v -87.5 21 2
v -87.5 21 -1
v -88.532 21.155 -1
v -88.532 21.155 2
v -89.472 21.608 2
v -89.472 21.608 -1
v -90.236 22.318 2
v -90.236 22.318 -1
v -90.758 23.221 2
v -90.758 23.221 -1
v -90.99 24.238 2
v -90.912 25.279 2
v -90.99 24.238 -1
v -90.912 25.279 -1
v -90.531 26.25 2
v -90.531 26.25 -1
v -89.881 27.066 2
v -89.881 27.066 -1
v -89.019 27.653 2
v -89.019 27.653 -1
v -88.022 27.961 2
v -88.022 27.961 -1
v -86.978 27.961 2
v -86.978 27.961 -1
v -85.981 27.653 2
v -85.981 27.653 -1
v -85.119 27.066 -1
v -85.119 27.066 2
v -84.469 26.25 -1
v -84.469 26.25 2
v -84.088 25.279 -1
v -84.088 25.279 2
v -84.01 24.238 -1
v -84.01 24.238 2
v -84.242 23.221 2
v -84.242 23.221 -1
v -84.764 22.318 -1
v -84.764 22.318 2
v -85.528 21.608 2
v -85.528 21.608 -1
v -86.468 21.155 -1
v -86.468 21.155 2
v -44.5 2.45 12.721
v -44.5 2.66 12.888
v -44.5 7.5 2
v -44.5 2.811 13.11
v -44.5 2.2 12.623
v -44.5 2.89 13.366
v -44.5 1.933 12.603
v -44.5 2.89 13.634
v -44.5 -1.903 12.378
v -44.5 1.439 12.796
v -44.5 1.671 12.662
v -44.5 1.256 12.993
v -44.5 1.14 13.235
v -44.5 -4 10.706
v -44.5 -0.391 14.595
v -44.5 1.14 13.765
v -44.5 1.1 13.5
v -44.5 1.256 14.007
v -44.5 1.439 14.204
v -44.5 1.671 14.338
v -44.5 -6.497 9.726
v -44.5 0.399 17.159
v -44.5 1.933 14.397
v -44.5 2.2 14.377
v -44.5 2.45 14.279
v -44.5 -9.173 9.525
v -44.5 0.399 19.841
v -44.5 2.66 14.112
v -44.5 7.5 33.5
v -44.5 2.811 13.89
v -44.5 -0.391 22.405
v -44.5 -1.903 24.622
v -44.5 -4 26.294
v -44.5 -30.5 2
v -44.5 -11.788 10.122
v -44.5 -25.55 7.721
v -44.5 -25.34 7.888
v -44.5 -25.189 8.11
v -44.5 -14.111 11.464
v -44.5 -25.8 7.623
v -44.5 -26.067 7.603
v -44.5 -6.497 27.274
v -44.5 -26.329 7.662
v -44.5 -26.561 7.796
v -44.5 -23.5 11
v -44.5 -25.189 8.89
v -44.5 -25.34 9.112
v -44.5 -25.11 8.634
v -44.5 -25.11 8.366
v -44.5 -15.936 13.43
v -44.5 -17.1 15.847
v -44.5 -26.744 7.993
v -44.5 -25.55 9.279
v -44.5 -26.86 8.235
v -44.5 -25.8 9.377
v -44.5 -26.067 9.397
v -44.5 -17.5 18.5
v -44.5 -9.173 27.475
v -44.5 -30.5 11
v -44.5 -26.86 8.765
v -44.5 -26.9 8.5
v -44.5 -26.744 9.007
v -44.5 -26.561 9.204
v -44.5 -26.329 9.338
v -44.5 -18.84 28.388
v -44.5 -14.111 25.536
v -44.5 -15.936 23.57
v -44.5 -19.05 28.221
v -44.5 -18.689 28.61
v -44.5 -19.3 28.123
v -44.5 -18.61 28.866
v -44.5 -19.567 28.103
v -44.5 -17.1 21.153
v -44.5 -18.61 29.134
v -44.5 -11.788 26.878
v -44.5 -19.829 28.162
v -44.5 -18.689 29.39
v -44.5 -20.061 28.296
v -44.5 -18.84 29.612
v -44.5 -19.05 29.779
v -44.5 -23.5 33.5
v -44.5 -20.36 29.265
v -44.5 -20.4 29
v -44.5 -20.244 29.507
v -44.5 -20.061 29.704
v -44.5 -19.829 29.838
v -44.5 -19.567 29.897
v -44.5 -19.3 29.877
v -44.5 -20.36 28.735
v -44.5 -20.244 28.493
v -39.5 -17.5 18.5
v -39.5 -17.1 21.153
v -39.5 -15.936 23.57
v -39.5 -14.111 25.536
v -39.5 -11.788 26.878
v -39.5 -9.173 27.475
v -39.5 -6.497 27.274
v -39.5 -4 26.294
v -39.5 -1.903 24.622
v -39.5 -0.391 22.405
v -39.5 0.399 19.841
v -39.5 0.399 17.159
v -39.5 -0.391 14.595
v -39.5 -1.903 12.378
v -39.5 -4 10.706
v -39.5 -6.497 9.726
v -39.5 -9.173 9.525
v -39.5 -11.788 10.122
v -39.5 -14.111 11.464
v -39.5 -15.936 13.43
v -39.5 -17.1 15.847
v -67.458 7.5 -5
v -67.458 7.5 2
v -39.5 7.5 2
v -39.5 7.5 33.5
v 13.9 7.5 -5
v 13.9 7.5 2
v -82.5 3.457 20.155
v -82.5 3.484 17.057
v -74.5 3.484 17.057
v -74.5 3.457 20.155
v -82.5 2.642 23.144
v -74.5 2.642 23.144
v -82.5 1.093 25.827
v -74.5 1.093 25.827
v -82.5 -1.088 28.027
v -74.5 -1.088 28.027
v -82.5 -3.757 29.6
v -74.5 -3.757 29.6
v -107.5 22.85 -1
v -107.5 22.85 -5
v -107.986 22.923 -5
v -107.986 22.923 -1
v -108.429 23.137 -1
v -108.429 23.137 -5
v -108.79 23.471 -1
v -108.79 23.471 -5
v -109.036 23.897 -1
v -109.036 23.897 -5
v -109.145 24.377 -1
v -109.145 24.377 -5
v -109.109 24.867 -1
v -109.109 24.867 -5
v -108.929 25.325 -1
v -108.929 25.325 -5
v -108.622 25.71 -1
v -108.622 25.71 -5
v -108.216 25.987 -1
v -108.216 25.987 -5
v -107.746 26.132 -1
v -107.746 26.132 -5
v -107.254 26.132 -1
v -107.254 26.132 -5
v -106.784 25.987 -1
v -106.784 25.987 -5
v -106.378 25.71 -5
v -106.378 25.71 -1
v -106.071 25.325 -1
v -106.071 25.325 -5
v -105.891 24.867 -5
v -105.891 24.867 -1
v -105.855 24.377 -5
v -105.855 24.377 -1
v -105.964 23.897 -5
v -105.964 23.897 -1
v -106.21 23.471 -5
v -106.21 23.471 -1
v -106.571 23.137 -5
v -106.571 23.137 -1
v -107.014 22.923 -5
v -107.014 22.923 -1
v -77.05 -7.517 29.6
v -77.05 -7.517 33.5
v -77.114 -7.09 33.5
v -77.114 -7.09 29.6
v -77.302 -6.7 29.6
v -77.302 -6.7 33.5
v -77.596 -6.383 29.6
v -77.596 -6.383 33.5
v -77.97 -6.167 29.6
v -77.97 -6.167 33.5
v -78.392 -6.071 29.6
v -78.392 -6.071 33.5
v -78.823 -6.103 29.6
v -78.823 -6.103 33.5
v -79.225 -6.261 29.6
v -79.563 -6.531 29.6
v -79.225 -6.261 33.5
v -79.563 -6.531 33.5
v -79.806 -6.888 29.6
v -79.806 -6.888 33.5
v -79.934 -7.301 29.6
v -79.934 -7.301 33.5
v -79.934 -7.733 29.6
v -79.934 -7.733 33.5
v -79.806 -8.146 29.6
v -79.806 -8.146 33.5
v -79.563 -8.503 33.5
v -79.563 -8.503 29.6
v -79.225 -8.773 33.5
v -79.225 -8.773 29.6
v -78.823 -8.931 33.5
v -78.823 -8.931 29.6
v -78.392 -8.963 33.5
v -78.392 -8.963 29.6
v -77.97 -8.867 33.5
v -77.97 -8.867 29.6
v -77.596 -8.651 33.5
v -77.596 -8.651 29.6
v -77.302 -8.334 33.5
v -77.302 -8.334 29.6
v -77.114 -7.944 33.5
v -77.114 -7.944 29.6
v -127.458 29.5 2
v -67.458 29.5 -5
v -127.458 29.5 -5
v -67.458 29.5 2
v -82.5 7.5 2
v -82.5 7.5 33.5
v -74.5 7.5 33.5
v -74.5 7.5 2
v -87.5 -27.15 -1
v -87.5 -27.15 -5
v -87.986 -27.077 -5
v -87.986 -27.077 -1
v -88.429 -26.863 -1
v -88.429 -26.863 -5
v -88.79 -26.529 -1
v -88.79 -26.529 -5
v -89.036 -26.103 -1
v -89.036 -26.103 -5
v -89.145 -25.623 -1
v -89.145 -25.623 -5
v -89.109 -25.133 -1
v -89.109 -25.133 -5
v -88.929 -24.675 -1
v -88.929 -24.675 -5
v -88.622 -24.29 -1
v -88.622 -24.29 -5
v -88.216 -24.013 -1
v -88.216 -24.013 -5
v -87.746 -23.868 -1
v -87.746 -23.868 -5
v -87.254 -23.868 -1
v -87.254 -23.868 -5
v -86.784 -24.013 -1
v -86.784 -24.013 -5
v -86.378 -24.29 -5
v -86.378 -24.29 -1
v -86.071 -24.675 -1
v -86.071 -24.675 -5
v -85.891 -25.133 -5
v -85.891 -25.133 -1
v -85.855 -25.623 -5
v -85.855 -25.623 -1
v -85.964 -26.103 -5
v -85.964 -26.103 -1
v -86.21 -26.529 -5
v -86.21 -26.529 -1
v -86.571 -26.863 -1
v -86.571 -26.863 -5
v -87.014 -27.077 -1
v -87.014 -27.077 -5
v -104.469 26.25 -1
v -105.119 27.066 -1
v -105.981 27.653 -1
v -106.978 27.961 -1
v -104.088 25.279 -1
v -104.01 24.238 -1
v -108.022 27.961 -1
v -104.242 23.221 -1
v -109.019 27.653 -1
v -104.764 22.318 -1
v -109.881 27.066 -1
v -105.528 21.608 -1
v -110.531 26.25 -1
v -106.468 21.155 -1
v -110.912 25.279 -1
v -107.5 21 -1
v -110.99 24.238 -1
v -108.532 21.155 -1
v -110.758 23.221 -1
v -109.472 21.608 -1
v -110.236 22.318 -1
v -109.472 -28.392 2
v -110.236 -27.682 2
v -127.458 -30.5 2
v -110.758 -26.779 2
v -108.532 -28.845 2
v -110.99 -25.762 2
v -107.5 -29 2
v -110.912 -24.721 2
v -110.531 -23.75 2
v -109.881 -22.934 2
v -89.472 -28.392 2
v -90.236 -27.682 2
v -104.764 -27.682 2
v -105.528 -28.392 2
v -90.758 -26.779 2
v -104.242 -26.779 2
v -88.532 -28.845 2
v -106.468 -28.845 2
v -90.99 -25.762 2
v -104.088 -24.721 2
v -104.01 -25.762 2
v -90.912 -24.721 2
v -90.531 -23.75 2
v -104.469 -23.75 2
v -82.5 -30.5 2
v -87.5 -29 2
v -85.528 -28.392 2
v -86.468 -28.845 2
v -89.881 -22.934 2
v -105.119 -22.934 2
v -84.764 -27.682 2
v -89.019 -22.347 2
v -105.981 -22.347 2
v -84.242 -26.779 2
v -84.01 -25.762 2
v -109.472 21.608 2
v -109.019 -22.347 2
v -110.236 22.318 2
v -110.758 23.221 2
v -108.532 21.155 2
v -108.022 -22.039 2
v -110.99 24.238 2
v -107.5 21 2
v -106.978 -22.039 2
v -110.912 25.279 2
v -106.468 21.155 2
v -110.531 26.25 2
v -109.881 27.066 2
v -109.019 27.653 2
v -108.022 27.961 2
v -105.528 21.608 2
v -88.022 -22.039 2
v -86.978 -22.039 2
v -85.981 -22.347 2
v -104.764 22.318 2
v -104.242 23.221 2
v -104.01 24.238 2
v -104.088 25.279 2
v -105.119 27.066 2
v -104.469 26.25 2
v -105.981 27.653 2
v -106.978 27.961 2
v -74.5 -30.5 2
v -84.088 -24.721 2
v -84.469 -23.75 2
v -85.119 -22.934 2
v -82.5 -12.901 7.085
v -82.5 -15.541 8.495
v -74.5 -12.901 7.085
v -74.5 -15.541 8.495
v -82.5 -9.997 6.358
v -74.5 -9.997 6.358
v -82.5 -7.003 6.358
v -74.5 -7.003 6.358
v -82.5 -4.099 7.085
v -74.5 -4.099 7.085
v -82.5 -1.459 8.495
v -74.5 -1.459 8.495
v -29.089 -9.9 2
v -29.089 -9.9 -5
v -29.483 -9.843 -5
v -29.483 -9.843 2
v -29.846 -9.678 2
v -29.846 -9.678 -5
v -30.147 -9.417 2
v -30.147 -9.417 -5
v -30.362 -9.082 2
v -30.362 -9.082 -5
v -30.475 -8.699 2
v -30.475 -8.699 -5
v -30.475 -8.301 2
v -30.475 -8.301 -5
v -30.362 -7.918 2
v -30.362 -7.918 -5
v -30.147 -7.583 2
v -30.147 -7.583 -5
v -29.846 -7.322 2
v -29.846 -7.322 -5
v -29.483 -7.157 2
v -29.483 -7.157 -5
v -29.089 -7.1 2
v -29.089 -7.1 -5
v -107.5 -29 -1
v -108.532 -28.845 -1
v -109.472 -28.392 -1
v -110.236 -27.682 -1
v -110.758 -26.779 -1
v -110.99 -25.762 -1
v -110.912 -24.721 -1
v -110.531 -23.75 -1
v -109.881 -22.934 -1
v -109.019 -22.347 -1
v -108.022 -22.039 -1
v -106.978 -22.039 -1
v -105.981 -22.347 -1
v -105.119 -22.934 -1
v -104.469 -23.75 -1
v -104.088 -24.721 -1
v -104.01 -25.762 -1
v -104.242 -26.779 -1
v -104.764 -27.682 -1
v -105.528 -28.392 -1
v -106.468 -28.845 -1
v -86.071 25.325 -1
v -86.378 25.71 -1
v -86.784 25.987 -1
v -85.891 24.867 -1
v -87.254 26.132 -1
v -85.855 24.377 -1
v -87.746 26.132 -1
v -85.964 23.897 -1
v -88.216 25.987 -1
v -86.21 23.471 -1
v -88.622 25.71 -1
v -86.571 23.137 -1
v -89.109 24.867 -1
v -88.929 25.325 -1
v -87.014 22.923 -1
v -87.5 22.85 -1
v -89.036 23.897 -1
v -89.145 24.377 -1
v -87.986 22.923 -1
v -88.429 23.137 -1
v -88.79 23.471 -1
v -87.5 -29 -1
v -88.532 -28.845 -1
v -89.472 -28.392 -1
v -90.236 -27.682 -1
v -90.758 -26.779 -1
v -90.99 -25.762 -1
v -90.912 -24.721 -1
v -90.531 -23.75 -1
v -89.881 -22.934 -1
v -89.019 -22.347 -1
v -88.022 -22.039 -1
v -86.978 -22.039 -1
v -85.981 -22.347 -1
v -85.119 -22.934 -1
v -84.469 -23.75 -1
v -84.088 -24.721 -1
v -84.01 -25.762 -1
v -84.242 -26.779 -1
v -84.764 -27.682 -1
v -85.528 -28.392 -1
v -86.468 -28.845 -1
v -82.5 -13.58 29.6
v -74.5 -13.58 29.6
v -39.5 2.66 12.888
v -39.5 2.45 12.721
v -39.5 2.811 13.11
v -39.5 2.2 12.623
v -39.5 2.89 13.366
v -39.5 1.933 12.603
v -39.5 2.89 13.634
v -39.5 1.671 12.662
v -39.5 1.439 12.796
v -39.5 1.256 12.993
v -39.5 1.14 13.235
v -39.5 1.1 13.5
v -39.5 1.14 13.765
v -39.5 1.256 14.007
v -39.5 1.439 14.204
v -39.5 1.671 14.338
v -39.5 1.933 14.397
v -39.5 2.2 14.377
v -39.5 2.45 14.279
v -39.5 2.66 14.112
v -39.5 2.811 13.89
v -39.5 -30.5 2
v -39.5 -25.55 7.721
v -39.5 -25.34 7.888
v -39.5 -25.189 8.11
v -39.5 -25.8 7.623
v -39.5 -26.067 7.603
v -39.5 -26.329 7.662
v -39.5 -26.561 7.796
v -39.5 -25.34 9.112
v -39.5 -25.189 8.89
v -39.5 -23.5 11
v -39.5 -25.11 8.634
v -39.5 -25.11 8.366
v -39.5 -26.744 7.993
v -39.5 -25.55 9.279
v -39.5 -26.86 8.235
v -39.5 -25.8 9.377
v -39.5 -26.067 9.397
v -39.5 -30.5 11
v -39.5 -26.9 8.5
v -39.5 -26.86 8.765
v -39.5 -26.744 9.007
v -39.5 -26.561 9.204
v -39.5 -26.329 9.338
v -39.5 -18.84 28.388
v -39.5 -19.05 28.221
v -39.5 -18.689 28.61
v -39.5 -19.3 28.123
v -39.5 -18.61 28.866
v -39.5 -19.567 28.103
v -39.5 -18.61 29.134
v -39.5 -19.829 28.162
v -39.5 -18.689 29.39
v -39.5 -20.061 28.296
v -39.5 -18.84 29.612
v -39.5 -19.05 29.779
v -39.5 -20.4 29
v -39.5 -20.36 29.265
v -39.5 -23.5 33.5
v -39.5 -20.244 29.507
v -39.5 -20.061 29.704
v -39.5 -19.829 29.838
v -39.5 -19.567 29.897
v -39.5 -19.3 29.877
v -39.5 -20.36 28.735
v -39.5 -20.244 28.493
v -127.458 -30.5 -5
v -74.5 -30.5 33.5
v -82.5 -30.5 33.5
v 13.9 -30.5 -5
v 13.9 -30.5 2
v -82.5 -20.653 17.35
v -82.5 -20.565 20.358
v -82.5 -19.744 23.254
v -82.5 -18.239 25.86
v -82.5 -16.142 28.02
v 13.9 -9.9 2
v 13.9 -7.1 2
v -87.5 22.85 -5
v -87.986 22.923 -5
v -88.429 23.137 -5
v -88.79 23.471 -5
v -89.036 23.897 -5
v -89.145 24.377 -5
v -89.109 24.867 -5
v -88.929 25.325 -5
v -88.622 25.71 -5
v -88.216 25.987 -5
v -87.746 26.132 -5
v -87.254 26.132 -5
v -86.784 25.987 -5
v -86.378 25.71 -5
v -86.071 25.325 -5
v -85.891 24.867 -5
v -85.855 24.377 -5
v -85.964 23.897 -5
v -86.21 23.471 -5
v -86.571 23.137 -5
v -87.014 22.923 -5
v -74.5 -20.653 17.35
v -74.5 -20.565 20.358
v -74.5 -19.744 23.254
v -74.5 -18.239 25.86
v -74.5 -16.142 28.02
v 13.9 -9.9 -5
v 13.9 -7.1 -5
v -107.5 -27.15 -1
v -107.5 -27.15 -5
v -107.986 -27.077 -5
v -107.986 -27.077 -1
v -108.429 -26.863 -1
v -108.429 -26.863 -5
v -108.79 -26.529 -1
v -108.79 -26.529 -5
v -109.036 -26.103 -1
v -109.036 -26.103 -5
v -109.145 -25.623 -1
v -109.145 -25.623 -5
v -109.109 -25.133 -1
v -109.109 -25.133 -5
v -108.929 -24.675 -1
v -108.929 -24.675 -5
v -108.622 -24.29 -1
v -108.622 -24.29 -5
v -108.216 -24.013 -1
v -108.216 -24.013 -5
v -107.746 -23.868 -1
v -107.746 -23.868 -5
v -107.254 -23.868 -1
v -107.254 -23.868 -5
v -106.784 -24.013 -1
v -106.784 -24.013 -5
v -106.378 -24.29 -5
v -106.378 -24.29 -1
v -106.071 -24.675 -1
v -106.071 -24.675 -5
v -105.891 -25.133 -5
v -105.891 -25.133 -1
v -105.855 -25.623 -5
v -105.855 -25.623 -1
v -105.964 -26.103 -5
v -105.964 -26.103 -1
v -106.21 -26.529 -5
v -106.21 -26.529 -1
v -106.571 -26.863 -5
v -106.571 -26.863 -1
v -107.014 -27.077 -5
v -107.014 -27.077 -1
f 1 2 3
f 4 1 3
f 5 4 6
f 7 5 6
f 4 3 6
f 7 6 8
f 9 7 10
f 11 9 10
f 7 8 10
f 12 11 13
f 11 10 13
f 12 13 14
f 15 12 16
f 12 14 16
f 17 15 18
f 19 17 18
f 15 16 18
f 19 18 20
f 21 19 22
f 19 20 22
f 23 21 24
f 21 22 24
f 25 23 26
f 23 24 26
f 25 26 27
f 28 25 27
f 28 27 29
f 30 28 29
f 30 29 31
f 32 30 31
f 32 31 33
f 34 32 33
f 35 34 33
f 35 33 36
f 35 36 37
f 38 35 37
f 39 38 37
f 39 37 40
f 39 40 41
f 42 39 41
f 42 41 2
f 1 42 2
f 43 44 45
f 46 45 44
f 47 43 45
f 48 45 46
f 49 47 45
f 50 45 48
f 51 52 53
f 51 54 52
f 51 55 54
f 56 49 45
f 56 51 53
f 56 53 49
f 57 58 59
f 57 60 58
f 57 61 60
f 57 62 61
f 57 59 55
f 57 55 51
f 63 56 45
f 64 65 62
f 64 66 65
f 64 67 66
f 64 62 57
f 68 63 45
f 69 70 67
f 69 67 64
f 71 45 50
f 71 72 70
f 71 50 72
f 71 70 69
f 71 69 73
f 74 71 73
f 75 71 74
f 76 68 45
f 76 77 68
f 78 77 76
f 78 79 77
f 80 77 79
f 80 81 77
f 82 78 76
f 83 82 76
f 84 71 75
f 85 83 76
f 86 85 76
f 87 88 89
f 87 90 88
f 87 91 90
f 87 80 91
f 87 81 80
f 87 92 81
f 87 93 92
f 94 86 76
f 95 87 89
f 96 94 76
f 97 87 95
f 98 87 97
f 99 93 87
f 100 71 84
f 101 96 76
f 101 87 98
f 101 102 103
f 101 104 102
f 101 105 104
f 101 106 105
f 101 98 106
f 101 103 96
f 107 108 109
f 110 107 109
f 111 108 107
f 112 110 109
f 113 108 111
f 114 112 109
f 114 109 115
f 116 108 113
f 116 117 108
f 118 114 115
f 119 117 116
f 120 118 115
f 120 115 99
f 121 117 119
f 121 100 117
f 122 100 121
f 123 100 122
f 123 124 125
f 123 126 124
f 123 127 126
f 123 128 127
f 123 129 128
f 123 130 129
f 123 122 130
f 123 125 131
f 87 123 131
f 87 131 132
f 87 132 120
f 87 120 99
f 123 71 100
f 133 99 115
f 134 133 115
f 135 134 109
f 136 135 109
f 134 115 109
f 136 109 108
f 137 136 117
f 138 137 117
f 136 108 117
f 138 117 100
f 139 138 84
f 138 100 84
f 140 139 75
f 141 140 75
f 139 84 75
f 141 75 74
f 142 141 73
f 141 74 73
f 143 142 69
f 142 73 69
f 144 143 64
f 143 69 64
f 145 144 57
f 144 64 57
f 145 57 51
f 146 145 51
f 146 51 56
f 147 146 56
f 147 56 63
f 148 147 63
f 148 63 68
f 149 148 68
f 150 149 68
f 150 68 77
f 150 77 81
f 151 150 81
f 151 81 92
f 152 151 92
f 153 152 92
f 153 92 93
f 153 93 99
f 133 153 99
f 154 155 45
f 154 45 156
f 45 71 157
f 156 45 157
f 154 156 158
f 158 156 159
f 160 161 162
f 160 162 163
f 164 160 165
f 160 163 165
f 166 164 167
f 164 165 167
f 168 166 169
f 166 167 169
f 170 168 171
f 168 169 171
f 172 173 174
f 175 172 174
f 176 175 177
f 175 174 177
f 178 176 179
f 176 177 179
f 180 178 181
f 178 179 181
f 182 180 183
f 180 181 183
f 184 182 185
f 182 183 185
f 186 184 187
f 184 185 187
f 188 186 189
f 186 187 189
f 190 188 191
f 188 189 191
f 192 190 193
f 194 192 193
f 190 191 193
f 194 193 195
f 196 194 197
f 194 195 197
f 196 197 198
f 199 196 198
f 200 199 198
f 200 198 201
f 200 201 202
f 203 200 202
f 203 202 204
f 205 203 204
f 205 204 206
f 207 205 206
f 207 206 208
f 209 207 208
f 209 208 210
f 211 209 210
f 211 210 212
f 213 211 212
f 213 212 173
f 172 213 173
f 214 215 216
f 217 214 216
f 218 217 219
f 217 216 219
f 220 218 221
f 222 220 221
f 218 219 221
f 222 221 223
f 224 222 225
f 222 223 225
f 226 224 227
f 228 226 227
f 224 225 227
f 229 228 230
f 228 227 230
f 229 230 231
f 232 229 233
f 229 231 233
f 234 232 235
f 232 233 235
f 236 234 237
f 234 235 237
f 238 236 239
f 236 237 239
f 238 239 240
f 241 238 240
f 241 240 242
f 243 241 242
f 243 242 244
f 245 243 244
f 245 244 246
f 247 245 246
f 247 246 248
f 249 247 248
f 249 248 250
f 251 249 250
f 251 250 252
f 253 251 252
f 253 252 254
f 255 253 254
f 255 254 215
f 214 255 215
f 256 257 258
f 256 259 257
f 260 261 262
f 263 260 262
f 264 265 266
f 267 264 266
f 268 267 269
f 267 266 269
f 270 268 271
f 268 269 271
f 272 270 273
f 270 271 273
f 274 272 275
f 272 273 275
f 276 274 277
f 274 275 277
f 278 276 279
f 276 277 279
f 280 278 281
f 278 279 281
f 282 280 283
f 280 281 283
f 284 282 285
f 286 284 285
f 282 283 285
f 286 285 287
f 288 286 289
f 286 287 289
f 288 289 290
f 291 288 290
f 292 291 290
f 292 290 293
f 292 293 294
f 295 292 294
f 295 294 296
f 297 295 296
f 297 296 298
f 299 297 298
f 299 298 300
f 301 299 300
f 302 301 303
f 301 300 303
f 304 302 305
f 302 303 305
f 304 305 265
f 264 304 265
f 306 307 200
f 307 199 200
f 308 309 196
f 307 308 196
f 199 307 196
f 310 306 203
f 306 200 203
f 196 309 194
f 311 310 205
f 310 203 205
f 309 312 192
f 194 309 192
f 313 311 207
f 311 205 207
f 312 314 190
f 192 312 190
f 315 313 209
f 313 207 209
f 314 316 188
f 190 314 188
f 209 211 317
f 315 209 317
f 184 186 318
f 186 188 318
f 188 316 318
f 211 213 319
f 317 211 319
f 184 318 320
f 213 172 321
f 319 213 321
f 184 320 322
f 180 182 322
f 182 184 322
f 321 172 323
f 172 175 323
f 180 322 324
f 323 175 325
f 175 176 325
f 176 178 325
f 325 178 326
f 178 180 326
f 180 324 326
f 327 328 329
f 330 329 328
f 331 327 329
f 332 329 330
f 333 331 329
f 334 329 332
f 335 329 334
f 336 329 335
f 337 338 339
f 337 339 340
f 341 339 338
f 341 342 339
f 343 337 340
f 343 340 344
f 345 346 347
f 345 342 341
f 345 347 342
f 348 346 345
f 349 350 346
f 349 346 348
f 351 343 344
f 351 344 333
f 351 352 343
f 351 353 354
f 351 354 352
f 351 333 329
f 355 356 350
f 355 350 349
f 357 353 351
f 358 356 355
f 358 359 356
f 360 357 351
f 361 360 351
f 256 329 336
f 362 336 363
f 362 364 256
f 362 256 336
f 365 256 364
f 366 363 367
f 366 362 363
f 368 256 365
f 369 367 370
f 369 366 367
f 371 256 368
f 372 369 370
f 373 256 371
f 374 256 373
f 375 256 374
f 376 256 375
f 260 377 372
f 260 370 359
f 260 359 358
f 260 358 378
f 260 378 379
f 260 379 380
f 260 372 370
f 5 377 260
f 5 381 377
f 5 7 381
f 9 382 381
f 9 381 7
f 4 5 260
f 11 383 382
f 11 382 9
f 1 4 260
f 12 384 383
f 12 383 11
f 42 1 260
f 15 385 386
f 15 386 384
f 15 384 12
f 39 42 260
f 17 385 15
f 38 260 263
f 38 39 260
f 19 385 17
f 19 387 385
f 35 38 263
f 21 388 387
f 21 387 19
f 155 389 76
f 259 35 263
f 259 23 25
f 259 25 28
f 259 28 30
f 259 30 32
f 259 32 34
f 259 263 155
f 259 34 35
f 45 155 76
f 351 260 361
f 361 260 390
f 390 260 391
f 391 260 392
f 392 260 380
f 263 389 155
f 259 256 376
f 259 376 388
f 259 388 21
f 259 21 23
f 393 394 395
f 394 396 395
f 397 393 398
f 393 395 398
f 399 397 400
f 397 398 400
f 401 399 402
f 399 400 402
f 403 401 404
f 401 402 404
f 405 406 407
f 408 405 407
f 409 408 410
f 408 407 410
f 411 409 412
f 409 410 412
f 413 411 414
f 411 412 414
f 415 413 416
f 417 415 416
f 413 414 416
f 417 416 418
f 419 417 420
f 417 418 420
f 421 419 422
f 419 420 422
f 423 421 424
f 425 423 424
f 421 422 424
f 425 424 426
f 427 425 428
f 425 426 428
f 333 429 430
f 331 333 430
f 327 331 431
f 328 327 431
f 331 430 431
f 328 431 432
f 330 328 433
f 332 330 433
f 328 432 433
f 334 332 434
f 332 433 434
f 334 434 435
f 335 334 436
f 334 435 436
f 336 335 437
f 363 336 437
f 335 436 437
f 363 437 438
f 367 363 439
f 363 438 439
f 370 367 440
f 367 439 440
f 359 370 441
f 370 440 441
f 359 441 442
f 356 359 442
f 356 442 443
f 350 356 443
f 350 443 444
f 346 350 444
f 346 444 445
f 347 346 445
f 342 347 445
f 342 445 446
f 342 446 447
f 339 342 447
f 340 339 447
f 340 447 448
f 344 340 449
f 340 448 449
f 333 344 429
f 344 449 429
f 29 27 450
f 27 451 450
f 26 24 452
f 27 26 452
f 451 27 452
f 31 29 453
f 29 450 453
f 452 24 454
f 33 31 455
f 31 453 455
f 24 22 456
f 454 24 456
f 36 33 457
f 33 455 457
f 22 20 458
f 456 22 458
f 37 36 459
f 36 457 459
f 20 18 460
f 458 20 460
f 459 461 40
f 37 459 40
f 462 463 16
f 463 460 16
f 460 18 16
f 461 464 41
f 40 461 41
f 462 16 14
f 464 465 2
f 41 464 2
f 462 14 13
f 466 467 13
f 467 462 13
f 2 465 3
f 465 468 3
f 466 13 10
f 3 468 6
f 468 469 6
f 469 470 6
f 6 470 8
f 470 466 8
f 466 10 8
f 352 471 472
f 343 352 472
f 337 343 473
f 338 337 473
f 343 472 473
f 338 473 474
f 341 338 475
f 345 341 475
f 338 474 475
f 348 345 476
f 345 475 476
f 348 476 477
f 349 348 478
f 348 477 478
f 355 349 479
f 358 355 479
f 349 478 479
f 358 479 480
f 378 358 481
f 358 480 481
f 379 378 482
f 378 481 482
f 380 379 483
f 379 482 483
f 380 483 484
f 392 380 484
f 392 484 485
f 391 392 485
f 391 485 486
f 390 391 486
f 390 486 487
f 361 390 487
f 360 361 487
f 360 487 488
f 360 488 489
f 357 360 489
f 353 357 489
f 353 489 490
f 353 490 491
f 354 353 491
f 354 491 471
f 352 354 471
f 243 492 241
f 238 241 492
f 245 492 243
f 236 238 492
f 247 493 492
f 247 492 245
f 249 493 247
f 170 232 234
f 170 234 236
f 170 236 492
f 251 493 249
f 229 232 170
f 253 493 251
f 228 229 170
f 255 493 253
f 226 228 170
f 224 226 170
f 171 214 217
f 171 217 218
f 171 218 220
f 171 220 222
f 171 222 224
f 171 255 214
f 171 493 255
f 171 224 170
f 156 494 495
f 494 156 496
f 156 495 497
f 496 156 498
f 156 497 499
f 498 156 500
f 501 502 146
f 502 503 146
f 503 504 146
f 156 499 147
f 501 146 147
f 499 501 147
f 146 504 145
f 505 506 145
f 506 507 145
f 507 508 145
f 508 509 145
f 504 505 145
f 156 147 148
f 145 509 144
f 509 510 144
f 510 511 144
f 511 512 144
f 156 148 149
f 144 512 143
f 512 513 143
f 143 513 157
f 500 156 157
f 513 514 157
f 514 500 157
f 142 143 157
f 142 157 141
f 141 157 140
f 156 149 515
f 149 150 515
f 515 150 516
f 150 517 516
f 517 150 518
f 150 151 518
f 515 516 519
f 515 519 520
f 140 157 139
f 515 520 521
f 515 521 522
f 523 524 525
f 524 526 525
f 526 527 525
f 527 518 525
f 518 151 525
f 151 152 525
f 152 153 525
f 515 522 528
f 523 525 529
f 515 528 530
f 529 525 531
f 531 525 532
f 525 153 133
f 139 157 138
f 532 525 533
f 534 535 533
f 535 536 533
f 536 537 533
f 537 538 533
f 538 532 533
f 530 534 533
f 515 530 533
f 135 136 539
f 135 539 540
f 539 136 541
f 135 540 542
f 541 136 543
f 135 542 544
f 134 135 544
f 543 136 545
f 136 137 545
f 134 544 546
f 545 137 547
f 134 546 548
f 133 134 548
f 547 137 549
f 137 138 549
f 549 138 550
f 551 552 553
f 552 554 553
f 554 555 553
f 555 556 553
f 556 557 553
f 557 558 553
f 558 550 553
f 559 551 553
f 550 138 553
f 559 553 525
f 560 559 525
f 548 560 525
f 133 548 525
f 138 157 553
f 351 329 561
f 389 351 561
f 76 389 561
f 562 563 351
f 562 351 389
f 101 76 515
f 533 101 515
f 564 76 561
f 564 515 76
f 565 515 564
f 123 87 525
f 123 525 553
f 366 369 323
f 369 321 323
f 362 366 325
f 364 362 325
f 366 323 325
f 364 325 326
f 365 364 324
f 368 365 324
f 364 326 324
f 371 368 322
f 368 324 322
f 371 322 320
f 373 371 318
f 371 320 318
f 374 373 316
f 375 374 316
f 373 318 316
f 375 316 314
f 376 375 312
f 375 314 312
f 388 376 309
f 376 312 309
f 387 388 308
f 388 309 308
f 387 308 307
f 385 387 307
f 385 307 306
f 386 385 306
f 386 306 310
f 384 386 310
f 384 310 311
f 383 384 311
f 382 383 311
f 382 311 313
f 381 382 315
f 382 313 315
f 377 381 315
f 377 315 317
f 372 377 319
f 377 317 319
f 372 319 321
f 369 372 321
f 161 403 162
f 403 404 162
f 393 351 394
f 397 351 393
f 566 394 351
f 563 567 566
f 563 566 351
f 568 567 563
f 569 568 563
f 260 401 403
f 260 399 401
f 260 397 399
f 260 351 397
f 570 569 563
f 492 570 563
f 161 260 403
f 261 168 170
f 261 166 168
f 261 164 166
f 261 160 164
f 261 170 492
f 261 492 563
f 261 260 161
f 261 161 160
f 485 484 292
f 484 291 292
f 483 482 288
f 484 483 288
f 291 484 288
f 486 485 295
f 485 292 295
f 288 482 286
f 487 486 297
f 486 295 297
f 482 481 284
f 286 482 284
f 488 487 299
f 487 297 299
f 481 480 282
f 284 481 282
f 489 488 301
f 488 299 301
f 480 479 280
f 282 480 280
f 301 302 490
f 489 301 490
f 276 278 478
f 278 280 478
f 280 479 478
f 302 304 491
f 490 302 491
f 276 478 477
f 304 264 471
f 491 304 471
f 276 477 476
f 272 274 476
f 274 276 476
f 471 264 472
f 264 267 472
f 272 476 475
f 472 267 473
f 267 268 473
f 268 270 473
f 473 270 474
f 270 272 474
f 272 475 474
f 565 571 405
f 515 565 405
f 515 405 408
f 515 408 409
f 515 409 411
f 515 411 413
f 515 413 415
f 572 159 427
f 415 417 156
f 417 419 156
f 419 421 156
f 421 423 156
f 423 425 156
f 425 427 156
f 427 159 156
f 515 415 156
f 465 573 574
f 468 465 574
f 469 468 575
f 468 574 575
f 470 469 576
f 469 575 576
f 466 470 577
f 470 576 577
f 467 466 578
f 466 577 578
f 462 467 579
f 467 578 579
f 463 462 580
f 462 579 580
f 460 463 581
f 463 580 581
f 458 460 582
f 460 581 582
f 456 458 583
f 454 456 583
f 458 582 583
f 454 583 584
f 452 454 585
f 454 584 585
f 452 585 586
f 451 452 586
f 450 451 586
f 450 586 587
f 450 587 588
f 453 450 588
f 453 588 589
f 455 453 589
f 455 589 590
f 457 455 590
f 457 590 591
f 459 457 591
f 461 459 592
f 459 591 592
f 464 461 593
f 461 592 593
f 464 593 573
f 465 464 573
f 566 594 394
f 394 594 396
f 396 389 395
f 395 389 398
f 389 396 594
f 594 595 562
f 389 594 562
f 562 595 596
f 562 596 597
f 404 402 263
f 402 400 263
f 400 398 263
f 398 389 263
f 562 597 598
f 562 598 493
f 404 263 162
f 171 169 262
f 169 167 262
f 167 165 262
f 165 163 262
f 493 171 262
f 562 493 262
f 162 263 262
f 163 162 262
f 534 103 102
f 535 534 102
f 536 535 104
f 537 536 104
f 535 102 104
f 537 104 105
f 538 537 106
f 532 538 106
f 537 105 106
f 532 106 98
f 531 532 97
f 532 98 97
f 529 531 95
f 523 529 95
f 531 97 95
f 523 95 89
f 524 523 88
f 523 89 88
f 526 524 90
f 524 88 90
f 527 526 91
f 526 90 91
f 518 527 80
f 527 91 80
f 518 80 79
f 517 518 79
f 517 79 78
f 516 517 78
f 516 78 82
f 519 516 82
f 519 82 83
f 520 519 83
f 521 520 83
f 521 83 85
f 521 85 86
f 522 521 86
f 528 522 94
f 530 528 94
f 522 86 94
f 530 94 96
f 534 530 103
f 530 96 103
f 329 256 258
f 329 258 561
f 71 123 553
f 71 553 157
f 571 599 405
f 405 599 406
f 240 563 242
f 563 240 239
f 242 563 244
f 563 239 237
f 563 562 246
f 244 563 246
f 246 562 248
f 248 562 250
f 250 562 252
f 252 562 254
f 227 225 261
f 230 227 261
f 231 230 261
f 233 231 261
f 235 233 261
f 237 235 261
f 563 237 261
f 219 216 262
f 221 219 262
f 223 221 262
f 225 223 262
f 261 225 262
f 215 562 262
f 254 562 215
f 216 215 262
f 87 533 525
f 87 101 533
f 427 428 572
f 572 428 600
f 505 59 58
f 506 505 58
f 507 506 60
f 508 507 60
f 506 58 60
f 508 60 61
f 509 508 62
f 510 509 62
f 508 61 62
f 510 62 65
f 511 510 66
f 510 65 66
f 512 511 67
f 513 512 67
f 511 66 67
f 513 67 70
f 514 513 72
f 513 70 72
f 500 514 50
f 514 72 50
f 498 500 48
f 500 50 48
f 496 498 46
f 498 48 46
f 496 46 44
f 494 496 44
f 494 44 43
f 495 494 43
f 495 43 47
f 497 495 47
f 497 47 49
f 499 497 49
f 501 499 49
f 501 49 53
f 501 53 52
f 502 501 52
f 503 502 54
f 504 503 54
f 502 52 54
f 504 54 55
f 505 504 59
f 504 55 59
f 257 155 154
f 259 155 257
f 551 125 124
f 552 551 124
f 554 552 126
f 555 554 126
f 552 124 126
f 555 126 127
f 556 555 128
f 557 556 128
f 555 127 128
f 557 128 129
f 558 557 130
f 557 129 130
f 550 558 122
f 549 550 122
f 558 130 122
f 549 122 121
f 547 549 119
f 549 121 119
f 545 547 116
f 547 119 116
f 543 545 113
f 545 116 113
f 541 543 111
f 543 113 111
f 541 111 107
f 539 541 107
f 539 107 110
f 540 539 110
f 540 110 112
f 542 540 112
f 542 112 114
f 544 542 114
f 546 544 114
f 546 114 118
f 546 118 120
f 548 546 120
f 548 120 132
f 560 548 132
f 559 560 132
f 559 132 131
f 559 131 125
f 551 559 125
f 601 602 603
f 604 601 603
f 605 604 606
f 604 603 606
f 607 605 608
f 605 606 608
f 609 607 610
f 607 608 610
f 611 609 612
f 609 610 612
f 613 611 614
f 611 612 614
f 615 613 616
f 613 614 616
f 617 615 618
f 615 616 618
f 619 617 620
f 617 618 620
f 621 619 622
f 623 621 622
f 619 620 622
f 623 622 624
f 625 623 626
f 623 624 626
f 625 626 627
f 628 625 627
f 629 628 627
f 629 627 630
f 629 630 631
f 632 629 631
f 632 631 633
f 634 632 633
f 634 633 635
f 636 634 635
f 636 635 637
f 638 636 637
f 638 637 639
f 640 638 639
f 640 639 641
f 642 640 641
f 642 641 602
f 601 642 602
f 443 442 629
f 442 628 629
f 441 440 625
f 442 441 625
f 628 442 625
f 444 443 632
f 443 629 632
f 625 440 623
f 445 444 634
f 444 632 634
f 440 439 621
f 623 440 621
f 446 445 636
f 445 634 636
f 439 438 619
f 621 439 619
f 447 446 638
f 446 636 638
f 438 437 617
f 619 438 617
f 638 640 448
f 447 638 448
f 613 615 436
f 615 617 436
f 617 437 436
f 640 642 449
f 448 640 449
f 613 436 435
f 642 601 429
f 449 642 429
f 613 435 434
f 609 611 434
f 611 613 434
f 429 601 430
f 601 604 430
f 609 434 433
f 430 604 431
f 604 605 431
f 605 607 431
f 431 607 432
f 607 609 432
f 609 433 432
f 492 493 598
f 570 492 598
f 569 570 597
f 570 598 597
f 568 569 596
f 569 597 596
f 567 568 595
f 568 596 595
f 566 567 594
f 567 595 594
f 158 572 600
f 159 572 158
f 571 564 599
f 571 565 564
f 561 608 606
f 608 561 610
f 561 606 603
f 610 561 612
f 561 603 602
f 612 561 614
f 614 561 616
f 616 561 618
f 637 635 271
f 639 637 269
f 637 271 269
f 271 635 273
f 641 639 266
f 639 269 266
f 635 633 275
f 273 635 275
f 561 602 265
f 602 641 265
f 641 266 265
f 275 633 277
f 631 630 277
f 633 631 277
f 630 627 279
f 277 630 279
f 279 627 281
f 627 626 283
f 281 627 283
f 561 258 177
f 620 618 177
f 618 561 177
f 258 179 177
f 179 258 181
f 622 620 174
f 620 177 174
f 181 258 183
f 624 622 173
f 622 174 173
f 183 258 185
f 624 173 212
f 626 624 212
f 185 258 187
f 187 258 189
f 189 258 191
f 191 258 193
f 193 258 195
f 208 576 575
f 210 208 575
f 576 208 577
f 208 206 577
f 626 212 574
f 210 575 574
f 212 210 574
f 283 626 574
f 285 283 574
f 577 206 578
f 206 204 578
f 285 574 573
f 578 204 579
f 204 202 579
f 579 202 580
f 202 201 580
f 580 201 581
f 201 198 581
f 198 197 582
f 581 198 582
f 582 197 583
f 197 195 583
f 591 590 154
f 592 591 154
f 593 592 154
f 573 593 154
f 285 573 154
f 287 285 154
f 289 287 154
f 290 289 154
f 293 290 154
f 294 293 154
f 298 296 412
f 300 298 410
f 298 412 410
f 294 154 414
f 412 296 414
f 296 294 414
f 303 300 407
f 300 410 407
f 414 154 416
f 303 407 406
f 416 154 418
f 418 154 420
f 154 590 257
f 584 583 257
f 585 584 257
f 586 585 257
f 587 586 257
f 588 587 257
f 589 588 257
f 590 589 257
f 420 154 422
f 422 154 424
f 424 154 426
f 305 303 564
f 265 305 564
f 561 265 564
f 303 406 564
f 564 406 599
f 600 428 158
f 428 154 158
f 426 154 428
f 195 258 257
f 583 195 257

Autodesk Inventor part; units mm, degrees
ref_plane "YZ Plane" through (0, 0, 0) normal (1, 0, 0) x (0, 1, 0)
ref_plane "Work Plane10" through (-44.5, -14.2241, 18.7548) normal (1, 0, 0) x (0, -0.9087, 0.4175)
ref_plane "Work Plane11" through (-44.5, -8.5, 18.5) normal (-1, 0, 0) x (0, -1, 0)
sketch "Sketch9" plane through (-44.5, -8.5, 18.5) normal (-1, 0, 0) x (0, -1, 0)
  line L0 (16.8555, -12.7) -> (20, -12.7) construction
  circle A0 centre (17.5, -10) radius 1 construction
  circle A1 centre (11, 10.5) radius 1 construction
  circle A2 centre (-10.5, -5) radius 1 construction
  circle A3 centre (0, 0) radius 2.4142 construction
  line L1 (-15, 15) -> (15, 15) construction
  line L2 (16, -16) -> (-16, -16) construction
  line L3 (15, 15) -> (15, -15) construction
  line L4 (16, 16) -> (16, -16) construction
  line L5 (-16, -16) -> (-16, 16) construction
  line L6 (15, 15) -> (-16, 15)
  line L7 (-16, 15) -> (-16, -16.5)
  line L8 (-16, -16.5) -> (15, -16.5)
  line L9 (15, -16.5) -> (15, 15)
  circle A4 centre (11, 10.5) radius 0.9
  circle A5 centre (17.5, -10) radius 0.9
  circle A6 centre (-10.5, -5) radius 0.9
  circle A7 centre (0, 0) radius 9
  line L10 (15, -16.5) -> (22, -16.5)
  line L11 (22, -16.5) -> (22, -7.5)
  line L12 (22, -7.5) -> (15, -7.5)
  line L13 (15, -7.5) -> (15, -16.5)
  point P0 (-8.5, -18.5)
  dimension "d34" = 31.5
  dimension "d35" = 1.8
  dimension "d36" = 1.8
  dimension "d37" = 1.8
  dimension "d38" = 18
  dimension "d39" = 7
  dimension "d40" = 9
extrude "Extrusion7" add sketch "Sketch9" against normal blind 5
ref_plane "Work Plane12" through (-127.4584, -23.859, -5) normal (0, 0, 1) x (1, 0, 0)
sketch "Sketch10" plane through (-44.5, -30.5, 2) normal (0, 0, -1) x (-1, 0, 0)
  line L0 (0, 0) -> (0, 38) projected
  line L1 (0, 38) -> (-5, 38) projected
  line L2 (-5, 0) -> (-5, 38) projected
  line L3 (0, 0) -> (-5, 0) projected
  circle A0 centre (-19, 22) radius 1.4
  circle A1 centre (-57, 22) radius 1.4
  line L4 (82.9584, 8.641) -> (82.9584, 51.641)
  line L5 (-58.4, 38) -> (82.9584, 38)
  line L6 (82.9584, 38) -> (82.9584, 0)
  line L7 (82.9584, 0) -> (-58.4, 0)
  line L8 (-58.4, 0) -> (-58.4, 38)
  line L9 (-63.3254, 22) -> (-14.2903, 22) construction
  line L10 (-61.7754, 20.45) -> (-15.8403, 20.45)
  line L11 (-15.8403, 23.55) -> (-61.7754, 23.55)
  arc A2 (-61.7754, 23.55) -> (-61.7754, 20.45) centre (-61.7754, 22) ccw
  arc A3 (-15.8403, 20.45) -> (-15.8403, 23.55) centre (-15.8403, 22) ccw
  point P0 (-44.5, 30.5)
  point P1 (-38.8079, 22)
  dimension "d43" = 3.1
extrude "Extrusion8" add sketch "Sketch10" along normal up to surface (7 mm away) contours L3 L2 L1 L0 | L0 L5 L4 L6 L7 | L7 L8 L10 A3 L11 L5 L2 | L8 L11 A3 L10
sketch "Sketch11" plane through (-44.5, -30.5, -5) normal (0, 0, -1) x (-1, 0, 0)
  circle A0 centre (-57, 22) radius 1.4 projected
  circle A1 centre (-19, 22) radius 1.4 projected
  line L0 (-61.4468, 22) -> (-14.0111, 22) construction
  line L1 (-60.0468, 20.6) -> (-15.4111, 20.6)
  line L2 (-15.4111, 23.4) -> (-60.0468, 23.4)
  arc A2 (-60.0468, 23.4) -> (-60.0468, 20.6) centre (-60.0468, 22) ccw
  arc A3 (-15.4111, 20.6) -> (-15.4111, 23.4) centre (-15.4111, 22) ccw
  point P0 (-44.5, 30.5)
  point P1 (-58.4, 22)
  point P2 (-37.729, 22)
extrude "Extrusion9" cut sketch "Sketch11" against normal through all contours A0 | A0 L2 A1 L1 | A0 L1 A2 L2 | L2 A3 L1 A1
ref_plane "Work Plane13" through (-74.5, -8.5, 18.5) normal (-1, 0, 0) x (0, 0, 1)
sketch "Sketch12" plane through (-74.5, -8.5, 18.5) normal (-1, 0, 0) x (0, 0, 1)
  circle A0 centre (0, 0) radius 10.125
  line L0 (-31.5, -12.684) -> (-23.5, -12.684)
  line L1 (-1.4, 6.6) -> (-6.6, 6.6)
  line L2 (-23.5, -22) -> (-23.5, 16) projected
  line L3 (-16.5, -22) -> (-23.5, -22) projected
  line L4 (-16.5, 16) -> (-16.5, -22) projected
  line L5 (-16.5, 16) -> (-23.5, 16) projected
  line L6 (15, 15) -> (15, -15)
  line L7 (-16.5, -22) -> (15, -22)
  line L8 (15, -22) -> (15, 16)
  line L9 (15, 16) -> (-16.5, 16)
  line L10 (-16.5, 16) -> (-16.5, -22)
  circle A1 centre (0, 0) radius 11.1
  line L11 (11.1, -5.0801) -> (11.1, 4.7426)
  line L12 (-1.1505, -12.1529) -> (-10.0048, -7.0409)
  line L13 (-10.0048, 7.0409) -> (-1.4428, 11.9842)
  arc A2 (-1.1505, -12.1529) -> (11.1, -5.0801) centre (0, 0) ccw
  arc A3 (11.1, 4.7426) -> (-1.4428, 11.9842) centre (0, 0) ccw
  arc A4 (-10.0048, 7.0409) -> (-10.0048, -7.0409) centre (0, 0) ccw
  point P0 (-18.5, 8.5)
  dimension "d51" = 60
  dimension "d52" = 60
  dimension "d73" = 22.2
extrude "Extrusion10" add sketch "Sketch12" along normal blind 8 contours L4 L9 L8 L6 L7
sketch "Sketch13" plane through (-74.5, -30.5, 33.5) normal (0, 0, 1) x (1, 0, 0)
  line L0 (0, 38) -> (0, 0) projected
  line L1 (0, 38) -> (-8, 38) projected
  line L2 (-8, 0) -> (-8, 38) projected
  line L3 (0, 0) -> (-8, 0) projected
  line L4 (6.7208, 32.125) -> (-12.4892, 32.125)
  circle A0 centre (-4, 22.9829) radius 1.45
  point P0 (74.5, 30.5)
  dimension "d55" = 2.9
extrude "Extrusion11" cut sketch "Sketch13" against normal blind 8 contours A0
sketch "Sketch14" plane through (-44.5, -30.5, 2) normal (0, 0, 1) x (1, 0, 0)
  circle A0 centre (-63, 55) radius 1.45
  circle A1 centre (-43, 55) radius 1.45
  line L0 (-30, 38) -> (-38, 38) projected
  line L1 (-82.9584, 38) -> (58.4, 38) projected
  line L2 (-82.9584, 38) -> (-22.9584, 38)
  line L3 (-22.9584, 38) -> (-22.9584, 60)
  line L4 (-22.9584, 60) -> (-82.9584, 60)
  line L5 (-82.9584, 60) -> (-82.9584, 38)
  point P0 (44.5, 30.5)
  dimension "d71" = 60
  dimension "d72" = 22
ref_plane "Work Plane14" through (-127.4584, -23.859, -5) normal (0, 0, 1) x (1, 0, 0)
extrude "Extrusion12" add sketch "Sketch14" against normal up to surface (7 mm away)
sketch "Sketch15" plane through (-44.5, -30.5, 2) normal (0, 0, 1) x (1, 0, 0)
  line L0 (-82.9584, 0) -> (-38, 0) projected
  line L1 (-38, 0) -> (-38, 38) projected
  line L2 (-30, 38) -> (-38, 38) projected
  line L3 (-30, 38) -> (-30, 0) projected
  line L4 (-30, 0) -> (0, 0) projected
  line L5 (0, 0) -> (0, 38) projected
  line L6 (0, 38) -> (-22.9584, 38) projected
  line L7 (58.4, 20.6) -> (15.4111, 20.6) projected
  arc A0 (15.4111, 23.4) -> (15.4111, 20.6) centre (15.4111, 22) ccw projected
  line L8 (15.4111, 23.4) -> (58.4, 23.4) projected
  line L9 (58.4, 23.4) -> (58.4, 38) projected
  line L10 (5, 0) -> (5, 38) projected
  line L11 (5, 0) -> (58.4, 0) projected
  line L12 (58.4, 0) -> (58.4, 20.6) projected
  line L13 (-22.9584, 38) -> (-22.9584, 60) projected
  line L14 (-22.9584, 60) -> (-82.9584, 60) projected
  circle A1 centre (-63, 5) radius 1.45
  circle A2 centre (-43, 5) radius 1.45
  circle A3 centre (-43, 55) radius 1.45 projected
  circle A4 centre (-63, 55) radius 1.45 projected
  line L15 (-82.9584, 60) -> (-82.9584, 0) projected
  line L16 (58.4, 38) -> (5, 38) projected
  point P0 (44.5, 30.5)
  point P1 (-42.9584, 11.641)
  point P2 (-62.9584, 11.641)
hole "Hole3" at (-107.5, -25.5, 2) at (-87.5, -25.5, 2) at (-107.5, 24.5, 2) at (-87.5, 24.5, 2) direction (0, 0, -1) diameter 3.3 end through all counterbore diameter 7 counterbore depth 3
properties part number "cellSTORM_inverted_Laser_left"
